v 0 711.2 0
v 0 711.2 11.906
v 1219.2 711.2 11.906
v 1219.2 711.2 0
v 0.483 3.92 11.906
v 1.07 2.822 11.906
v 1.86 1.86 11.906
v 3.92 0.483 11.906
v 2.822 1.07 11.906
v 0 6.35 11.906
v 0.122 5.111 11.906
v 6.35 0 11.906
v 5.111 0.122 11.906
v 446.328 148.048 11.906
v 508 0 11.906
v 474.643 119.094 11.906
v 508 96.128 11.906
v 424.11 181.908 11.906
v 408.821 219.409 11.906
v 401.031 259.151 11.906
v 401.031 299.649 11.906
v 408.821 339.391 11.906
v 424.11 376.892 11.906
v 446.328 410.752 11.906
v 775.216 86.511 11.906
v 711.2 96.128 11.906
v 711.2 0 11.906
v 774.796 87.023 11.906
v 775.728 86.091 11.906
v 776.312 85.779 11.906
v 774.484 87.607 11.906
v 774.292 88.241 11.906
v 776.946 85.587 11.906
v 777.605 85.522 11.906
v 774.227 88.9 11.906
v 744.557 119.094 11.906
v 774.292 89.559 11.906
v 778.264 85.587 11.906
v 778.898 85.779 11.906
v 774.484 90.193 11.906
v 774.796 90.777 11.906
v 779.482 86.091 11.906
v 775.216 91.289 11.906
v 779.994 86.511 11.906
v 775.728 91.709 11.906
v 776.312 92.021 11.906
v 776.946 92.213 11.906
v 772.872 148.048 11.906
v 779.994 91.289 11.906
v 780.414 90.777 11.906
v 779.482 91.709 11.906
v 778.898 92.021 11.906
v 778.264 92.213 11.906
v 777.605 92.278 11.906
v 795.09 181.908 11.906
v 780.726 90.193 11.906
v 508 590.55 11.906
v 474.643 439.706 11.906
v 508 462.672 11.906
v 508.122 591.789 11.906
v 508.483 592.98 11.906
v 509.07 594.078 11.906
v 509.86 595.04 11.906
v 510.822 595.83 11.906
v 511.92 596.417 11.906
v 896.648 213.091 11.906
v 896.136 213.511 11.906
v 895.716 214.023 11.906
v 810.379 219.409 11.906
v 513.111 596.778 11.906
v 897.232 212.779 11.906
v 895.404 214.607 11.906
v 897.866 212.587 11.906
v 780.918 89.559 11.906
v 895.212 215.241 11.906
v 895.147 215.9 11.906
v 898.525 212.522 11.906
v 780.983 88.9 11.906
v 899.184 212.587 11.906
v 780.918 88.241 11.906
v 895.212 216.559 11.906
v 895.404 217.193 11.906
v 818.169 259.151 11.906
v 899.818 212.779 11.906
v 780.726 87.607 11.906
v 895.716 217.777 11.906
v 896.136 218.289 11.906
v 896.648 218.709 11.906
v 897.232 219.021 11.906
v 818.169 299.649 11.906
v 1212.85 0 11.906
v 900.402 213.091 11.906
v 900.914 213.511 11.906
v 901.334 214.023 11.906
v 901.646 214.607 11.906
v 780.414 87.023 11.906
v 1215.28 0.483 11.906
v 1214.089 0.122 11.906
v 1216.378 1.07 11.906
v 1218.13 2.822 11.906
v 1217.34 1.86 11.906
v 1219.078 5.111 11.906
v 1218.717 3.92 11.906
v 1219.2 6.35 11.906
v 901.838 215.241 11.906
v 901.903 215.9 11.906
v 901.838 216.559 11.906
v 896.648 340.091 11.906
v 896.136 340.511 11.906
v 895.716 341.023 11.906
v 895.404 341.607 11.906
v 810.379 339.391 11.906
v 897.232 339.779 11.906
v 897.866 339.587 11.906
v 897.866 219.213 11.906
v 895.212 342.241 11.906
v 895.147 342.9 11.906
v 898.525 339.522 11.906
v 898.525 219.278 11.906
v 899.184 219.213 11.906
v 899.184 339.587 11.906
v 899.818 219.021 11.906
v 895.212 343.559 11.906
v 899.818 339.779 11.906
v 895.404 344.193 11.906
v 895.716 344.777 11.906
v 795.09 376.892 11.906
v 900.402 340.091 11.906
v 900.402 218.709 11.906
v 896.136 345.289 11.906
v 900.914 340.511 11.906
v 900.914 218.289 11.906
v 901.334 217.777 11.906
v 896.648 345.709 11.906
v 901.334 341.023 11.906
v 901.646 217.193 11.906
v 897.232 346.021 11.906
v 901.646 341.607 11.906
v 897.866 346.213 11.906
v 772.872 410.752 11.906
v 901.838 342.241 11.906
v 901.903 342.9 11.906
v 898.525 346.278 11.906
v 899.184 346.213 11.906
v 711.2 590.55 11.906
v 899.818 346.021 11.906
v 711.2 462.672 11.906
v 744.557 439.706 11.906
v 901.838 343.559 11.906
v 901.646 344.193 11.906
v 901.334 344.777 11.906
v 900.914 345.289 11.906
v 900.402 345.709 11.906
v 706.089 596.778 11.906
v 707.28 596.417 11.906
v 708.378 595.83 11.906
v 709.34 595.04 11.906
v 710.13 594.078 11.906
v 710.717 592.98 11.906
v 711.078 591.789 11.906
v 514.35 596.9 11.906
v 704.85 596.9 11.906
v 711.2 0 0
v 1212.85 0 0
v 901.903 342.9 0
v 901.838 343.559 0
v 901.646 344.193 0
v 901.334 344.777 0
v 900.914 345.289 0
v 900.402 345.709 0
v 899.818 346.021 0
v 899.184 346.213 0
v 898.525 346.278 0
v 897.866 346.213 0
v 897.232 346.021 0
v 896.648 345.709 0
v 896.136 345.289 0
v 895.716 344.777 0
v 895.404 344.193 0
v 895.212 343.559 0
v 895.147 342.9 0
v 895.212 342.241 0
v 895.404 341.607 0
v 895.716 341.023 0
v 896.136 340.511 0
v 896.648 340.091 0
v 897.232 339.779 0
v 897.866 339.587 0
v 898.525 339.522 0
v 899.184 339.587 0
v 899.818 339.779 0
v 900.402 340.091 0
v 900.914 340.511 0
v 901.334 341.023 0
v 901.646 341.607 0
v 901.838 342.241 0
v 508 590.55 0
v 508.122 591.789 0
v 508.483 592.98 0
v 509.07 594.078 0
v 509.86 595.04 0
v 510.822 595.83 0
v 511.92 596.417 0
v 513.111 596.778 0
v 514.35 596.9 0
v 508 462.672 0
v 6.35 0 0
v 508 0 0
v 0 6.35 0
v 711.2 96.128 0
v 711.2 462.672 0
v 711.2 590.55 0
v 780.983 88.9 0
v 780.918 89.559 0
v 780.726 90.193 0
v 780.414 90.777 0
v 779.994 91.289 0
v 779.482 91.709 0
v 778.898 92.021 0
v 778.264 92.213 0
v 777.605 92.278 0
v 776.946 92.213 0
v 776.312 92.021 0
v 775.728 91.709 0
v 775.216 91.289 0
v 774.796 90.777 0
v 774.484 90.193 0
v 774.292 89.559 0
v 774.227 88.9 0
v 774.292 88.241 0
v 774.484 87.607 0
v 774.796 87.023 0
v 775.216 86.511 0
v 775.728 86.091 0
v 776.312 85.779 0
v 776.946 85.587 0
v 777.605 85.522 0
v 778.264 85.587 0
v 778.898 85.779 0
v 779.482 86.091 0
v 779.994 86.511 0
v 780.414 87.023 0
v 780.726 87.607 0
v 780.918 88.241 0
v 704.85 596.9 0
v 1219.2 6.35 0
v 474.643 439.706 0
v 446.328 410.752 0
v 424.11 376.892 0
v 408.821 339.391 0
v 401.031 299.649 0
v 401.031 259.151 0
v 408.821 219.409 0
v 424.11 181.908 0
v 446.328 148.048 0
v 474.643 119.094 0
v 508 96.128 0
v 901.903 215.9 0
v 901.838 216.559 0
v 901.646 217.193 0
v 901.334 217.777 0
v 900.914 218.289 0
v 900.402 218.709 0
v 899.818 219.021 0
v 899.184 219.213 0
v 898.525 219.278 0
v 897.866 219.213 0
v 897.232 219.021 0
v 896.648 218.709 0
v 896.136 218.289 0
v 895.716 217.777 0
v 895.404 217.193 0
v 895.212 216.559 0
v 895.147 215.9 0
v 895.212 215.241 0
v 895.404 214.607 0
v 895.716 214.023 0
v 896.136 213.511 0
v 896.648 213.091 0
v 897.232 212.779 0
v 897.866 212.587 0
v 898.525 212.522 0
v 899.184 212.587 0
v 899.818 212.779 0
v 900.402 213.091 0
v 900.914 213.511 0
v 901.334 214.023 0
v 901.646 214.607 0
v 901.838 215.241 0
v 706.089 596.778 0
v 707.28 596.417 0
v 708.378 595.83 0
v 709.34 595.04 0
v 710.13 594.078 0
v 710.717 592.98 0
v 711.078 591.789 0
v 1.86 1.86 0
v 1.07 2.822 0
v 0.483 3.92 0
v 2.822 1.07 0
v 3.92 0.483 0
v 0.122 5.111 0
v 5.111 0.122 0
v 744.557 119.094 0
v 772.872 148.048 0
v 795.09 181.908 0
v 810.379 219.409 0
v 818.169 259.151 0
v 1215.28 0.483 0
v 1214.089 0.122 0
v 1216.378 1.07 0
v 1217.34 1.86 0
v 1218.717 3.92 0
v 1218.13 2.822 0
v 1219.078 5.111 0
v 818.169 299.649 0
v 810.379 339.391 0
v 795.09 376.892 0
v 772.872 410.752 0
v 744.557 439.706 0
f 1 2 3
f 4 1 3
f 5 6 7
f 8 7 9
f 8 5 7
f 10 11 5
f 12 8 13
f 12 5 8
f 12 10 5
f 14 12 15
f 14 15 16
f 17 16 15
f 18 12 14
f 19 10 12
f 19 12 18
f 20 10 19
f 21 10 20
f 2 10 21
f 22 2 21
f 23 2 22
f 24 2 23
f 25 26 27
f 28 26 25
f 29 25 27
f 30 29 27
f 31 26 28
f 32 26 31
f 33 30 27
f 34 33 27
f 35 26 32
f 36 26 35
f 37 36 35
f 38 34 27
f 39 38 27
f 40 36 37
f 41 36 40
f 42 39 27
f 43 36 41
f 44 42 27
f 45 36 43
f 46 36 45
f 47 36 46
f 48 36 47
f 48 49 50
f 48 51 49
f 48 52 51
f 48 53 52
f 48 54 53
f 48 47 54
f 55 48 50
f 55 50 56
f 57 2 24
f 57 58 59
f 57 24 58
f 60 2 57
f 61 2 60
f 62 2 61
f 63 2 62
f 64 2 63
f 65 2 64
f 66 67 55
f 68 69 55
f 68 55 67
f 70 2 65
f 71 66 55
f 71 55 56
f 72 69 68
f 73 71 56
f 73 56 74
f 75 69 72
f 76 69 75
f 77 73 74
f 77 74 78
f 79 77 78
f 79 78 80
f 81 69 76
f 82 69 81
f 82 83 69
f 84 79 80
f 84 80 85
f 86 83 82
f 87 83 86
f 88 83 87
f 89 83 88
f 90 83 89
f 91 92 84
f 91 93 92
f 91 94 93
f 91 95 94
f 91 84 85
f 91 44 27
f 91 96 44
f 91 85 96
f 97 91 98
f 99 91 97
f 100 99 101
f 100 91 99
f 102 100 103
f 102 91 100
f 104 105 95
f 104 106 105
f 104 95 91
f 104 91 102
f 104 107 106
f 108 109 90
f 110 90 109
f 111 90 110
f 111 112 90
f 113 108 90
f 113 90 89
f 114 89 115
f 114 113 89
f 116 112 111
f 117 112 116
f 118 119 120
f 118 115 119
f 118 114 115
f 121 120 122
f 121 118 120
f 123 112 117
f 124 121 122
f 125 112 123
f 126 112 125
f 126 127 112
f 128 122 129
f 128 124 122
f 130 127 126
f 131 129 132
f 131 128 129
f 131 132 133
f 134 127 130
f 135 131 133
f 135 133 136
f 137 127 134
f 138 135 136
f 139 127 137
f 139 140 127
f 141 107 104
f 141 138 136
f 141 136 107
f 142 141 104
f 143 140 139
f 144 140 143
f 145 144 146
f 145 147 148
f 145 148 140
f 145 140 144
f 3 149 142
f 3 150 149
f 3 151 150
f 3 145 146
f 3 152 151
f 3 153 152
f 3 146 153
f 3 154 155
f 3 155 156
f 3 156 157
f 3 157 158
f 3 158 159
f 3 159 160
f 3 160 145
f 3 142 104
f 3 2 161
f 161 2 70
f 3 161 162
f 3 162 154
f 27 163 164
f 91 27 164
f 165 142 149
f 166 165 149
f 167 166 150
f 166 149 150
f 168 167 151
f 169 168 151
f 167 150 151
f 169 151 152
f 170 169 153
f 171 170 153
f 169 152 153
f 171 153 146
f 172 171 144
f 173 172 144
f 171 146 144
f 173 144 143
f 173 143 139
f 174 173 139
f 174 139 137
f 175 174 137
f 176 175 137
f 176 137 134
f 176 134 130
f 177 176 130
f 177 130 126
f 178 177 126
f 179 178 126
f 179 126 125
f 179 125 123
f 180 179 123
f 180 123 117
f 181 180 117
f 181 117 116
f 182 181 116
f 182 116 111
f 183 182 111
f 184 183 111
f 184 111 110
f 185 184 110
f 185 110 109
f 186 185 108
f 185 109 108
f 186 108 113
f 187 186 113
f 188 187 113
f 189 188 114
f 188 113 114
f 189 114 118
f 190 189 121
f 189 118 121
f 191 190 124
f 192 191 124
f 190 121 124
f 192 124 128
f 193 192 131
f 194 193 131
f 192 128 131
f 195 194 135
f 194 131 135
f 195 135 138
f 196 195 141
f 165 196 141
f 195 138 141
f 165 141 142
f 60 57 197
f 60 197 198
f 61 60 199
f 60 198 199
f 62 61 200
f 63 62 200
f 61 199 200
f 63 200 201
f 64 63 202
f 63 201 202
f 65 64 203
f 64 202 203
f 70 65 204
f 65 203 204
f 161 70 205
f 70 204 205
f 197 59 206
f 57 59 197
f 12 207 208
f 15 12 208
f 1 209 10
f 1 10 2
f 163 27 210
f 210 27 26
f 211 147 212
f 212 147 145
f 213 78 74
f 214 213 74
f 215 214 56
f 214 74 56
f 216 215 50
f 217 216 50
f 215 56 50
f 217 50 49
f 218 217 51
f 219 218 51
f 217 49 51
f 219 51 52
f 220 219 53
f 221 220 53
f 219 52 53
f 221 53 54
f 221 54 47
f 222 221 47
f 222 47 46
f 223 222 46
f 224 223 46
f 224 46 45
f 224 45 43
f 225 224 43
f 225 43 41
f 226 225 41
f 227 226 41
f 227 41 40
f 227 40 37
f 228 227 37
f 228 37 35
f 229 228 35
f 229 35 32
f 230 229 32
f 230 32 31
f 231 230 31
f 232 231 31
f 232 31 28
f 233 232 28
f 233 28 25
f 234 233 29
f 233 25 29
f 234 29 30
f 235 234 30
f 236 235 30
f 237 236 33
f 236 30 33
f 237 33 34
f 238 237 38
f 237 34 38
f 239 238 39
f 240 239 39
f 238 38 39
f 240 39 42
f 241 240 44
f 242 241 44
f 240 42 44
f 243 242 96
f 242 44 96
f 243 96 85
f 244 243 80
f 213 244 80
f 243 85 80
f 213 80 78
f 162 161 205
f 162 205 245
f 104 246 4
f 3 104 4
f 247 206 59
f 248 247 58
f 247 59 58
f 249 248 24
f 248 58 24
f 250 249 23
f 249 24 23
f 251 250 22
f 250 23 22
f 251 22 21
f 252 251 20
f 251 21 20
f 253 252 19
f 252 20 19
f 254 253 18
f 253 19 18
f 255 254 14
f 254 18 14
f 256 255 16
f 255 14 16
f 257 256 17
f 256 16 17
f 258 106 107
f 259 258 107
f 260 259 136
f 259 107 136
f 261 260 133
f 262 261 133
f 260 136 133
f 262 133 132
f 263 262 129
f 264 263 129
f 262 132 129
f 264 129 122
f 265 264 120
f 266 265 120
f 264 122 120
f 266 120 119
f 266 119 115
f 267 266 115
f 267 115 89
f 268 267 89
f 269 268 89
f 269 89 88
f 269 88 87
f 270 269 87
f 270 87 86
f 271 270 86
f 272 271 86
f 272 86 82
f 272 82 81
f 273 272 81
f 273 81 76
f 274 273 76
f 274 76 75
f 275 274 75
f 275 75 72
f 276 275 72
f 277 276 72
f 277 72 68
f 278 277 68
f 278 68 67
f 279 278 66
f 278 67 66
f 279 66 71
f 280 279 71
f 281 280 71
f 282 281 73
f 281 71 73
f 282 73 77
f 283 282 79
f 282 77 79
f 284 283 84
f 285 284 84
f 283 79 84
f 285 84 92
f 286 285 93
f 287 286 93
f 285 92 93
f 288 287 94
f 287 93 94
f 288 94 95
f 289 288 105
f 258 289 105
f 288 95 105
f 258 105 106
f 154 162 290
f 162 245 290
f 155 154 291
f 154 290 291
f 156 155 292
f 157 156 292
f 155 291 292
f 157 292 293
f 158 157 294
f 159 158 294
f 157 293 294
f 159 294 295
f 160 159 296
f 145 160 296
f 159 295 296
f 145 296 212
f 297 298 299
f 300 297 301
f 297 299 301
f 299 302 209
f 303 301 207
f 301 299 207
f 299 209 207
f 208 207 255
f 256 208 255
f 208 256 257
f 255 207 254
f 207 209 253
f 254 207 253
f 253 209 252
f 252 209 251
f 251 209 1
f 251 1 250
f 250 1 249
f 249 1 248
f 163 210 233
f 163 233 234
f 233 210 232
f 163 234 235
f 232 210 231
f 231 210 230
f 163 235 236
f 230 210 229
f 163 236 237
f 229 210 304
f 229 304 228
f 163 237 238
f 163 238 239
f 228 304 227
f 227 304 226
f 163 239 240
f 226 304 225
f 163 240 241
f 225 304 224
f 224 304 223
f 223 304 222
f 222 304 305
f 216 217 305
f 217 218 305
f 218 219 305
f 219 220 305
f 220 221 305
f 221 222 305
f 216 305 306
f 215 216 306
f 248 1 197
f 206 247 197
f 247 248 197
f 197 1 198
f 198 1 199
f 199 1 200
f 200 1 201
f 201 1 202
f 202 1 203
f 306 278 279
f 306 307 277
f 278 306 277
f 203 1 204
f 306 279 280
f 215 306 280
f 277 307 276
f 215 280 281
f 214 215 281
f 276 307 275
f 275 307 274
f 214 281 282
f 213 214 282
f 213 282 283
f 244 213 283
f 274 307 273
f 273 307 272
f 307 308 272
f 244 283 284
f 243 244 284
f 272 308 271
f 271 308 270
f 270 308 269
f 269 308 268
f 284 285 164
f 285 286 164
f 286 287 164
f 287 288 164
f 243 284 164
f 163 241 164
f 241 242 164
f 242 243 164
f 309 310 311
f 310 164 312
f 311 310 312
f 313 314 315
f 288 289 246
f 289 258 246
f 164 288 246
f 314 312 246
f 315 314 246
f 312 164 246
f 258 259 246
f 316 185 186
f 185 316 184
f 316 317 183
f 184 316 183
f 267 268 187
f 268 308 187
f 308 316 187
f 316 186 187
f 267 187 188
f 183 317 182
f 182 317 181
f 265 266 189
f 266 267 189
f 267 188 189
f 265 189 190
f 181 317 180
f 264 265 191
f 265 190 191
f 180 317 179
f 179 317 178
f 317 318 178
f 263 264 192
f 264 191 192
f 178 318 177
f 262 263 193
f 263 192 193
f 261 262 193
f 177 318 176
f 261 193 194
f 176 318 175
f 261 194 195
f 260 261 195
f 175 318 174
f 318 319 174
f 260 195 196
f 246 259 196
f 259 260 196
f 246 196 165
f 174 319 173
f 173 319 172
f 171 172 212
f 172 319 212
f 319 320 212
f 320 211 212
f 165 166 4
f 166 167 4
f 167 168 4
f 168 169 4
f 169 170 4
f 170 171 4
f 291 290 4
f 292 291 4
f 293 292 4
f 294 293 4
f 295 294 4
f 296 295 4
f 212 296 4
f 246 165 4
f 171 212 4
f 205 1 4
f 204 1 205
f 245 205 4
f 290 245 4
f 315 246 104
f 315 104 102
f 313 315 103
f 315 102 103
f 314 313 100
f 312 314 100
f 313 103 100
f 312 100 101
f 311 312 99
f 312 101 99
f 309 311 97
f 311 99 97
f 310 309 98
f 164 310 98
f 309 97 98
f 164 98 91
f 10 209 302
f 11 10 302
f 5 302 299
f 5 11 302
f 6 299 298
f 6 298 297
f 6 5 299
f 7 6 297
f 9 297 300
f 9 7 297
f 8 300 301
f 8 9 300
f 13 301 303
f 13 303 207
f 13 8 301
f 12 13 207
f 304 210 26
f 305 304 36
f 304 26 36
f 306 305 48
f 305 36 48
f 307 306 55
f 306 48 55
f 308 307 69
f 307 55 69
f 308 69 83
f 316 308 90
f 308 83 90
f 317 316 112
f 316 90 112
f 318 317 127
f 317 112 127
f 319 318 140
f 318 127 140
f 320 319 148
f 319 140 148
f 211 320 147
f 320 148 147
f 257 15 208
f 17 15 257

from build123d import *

# Parameters (mm, degrees)
SKETCH1_W           = 1219.2
SKETCH1_H           = 1778
SKETCH1_R           = 254
SKETCH1_W_2         = 361.95
SKETCH1_H_2         = 361.95
BOSS_EXTRUDE1_DEPTH = 11.90625
SKETCH3_R           = 209.55
CUT_EXTRUDE2_DEPTH  = 12.90625
SKETCH2_W           = 203.2
SKETCH2_H           = 165.1
CUT_EXTRUDE1_DEPTH  = 12.90625
SKETCH5_R           = 3.429
CUT_EXTRUDE4_DEPTH  = 12.90625
LPATTERN2_COUNT     = 3
LPATTERN2_PITCH     = 301.625
SKETCH7_R           = 3.3782
CUT_EXTRUDE6_DEPTH  = 12.90625
SKETCH12_R          = 4.7625
CUT_EXTRUDE7_DEPTH  = 12.90625
SKETCH16_R          = 4.7625
CUT_EXTRUDE10_DEPTH = 12.90625
FILLET2_R           = 6.35
SKETCH19_W          = 1219.2
SKETCH19_H          = 1066.8
CUT_EXTRUDE13_DEPTH = 12.7


with BuildPart() as part:
    # Sketch1 → Boss-Extrude1 (new body)
    with BuildSketch(Plane.XY):
        with Locations((609.6, 889)):
            Rectangle(SKETCH1_W, SKETCH1_H)
        with Locations((330.2, 1473.2)):
            Circle(SKETCH1_R, mode=Mode.SUBTRACT)
        with Locations((609.6, 917.575)):
            Rectangle(SKETCH1_W_2, SKETCH1_H_2, mode=Mode.SUBTRACT)
    extrude(amount=BOSS_EXTRUDE1_DEPTH)

    # Sketch3 → Cut-Extrude2 (cut, through all)
    with BuildSketch(Plane.XY.offset(11.90625)):
        with Locations((609.6, 279.4)):
            Circle(SKETCH3_R)
    extrude(amount=-CUT_EXTRUDE2_DEPTH, mode=Mode.SUBTRACT)

    # Sketch2 → Cut-Extrude1 (cut, through all)
    with BuildSketch(Plane.XY.offset(11.90625)):
        with Locations((609.6, 44.45)):
            Rectangle(SKETCH2_W, SKETCH2_H)
        with Locations((609.6, 514.35)):
            Rectangle(SKETCH2_W, SKETCH2_H)
    extrude(amount=-CUT_EXTRUDE1_DEPTH, mode=Mode.SUBTRACT)

    # Sketch5 → Cut-Extrude4 (cut, through all)
    with BuildSketch(Plane.XY.offset(11.90625)):
        with Locations((609.6, 1714.5)):
            Circle(SKETCH5_R)
    cut_extrude4 = extrude(amount=-CUT_EXTRUDE4_DEPTH, mode=Mode.SUBTRACT)

    # LPattern2: Cut-Extrude4 ×3
    with Locations(*[(0, -i * LPATTERN2_PITCH, 0) for i in range(1, LPATTERN2_COUNT)]):
        add(cut_extrude4, mode=Mode.SUBTRACT)

    # Sketch7 → Cut-Extrude6 (cut, through all)
    with BuildSketch(Plane.XY.offset(11.90625)):
        with Locations((777.605208253, 88.9)):
            Circle(SKETCH7_R)
        with Locations((898.525, 342.9)):
            Circle(SKETCH7_R)
        with Locations((898.525, 215.9)):
            Circle(SKETCH7_R)
    extrude(amount=-CUT_EXTRUDE6_DEPTH, mode=Mode.SUBTRACT)

    # Sketch12 → Cut-Extrude7 (cut, through all)
    with BuildSketch(Plane.XY.offset(11.90625)):
        with Locations((203.2, 1727.2)):
            Circle(SKETCH12_R)
        with Locations((1016, 1727.2)):
            Circle(SKETCH12_R)
    extrude(amount=-CUT_EXTRUDE7_DEPTH, mode=Mode.SUBTRACT)

    # Sketch16 → Cut-Extrude10 (cut, through all)
    with BuildSketch(Plane.XY.offset(11.90625)):
        with Locations((419.1, 1054.1)):
            Circle(SKETCH16_R)
        with Locations((419.1, 787.4)):
            Circle(SKETCH16_R)
        with Locations((800.1, 1054.1)):
            Circle(SKETCH16_R)
        with Locations((800.1, 787.4)):
            Circle(SKETCH16_R)
    extrude(amount=-CUT_EXTRUDE10_DEPTH, mode=Mode.SUBTRACT)

    # Fillet2
    fillet2_edges = [part.edges().sort_by_distance(p)[0] for p in [
        (428.625, 1098.55, 5.953125),
        (428.625, 736.6, 5.953125),
        (790.575, 736.6, 5.953125),
        (790.575, 1098.55, 5.953125),
        (711.2, 596.9, 5.953125),
        (508, 596.9, 5.953125),
        (0, 0, 5.953125),
        (1219.2, 0, 5.953125),
    ]]
    fillet(fillet2_edges, radius=FILLET2_R)

    # Sketch19 → Cut-Extrude13 (cut)
    with BuildSketch(Plane.XY.offset(11.90625)):
        with Locations((609.6, 1244.6)):
            Rectangle(SKETCH19_W, SKETCH19_H)
    extrude(amount=-CUT_EXTRUDE13_DEPTH, mode=Mode.SUBTRACT)


solid = part.part
